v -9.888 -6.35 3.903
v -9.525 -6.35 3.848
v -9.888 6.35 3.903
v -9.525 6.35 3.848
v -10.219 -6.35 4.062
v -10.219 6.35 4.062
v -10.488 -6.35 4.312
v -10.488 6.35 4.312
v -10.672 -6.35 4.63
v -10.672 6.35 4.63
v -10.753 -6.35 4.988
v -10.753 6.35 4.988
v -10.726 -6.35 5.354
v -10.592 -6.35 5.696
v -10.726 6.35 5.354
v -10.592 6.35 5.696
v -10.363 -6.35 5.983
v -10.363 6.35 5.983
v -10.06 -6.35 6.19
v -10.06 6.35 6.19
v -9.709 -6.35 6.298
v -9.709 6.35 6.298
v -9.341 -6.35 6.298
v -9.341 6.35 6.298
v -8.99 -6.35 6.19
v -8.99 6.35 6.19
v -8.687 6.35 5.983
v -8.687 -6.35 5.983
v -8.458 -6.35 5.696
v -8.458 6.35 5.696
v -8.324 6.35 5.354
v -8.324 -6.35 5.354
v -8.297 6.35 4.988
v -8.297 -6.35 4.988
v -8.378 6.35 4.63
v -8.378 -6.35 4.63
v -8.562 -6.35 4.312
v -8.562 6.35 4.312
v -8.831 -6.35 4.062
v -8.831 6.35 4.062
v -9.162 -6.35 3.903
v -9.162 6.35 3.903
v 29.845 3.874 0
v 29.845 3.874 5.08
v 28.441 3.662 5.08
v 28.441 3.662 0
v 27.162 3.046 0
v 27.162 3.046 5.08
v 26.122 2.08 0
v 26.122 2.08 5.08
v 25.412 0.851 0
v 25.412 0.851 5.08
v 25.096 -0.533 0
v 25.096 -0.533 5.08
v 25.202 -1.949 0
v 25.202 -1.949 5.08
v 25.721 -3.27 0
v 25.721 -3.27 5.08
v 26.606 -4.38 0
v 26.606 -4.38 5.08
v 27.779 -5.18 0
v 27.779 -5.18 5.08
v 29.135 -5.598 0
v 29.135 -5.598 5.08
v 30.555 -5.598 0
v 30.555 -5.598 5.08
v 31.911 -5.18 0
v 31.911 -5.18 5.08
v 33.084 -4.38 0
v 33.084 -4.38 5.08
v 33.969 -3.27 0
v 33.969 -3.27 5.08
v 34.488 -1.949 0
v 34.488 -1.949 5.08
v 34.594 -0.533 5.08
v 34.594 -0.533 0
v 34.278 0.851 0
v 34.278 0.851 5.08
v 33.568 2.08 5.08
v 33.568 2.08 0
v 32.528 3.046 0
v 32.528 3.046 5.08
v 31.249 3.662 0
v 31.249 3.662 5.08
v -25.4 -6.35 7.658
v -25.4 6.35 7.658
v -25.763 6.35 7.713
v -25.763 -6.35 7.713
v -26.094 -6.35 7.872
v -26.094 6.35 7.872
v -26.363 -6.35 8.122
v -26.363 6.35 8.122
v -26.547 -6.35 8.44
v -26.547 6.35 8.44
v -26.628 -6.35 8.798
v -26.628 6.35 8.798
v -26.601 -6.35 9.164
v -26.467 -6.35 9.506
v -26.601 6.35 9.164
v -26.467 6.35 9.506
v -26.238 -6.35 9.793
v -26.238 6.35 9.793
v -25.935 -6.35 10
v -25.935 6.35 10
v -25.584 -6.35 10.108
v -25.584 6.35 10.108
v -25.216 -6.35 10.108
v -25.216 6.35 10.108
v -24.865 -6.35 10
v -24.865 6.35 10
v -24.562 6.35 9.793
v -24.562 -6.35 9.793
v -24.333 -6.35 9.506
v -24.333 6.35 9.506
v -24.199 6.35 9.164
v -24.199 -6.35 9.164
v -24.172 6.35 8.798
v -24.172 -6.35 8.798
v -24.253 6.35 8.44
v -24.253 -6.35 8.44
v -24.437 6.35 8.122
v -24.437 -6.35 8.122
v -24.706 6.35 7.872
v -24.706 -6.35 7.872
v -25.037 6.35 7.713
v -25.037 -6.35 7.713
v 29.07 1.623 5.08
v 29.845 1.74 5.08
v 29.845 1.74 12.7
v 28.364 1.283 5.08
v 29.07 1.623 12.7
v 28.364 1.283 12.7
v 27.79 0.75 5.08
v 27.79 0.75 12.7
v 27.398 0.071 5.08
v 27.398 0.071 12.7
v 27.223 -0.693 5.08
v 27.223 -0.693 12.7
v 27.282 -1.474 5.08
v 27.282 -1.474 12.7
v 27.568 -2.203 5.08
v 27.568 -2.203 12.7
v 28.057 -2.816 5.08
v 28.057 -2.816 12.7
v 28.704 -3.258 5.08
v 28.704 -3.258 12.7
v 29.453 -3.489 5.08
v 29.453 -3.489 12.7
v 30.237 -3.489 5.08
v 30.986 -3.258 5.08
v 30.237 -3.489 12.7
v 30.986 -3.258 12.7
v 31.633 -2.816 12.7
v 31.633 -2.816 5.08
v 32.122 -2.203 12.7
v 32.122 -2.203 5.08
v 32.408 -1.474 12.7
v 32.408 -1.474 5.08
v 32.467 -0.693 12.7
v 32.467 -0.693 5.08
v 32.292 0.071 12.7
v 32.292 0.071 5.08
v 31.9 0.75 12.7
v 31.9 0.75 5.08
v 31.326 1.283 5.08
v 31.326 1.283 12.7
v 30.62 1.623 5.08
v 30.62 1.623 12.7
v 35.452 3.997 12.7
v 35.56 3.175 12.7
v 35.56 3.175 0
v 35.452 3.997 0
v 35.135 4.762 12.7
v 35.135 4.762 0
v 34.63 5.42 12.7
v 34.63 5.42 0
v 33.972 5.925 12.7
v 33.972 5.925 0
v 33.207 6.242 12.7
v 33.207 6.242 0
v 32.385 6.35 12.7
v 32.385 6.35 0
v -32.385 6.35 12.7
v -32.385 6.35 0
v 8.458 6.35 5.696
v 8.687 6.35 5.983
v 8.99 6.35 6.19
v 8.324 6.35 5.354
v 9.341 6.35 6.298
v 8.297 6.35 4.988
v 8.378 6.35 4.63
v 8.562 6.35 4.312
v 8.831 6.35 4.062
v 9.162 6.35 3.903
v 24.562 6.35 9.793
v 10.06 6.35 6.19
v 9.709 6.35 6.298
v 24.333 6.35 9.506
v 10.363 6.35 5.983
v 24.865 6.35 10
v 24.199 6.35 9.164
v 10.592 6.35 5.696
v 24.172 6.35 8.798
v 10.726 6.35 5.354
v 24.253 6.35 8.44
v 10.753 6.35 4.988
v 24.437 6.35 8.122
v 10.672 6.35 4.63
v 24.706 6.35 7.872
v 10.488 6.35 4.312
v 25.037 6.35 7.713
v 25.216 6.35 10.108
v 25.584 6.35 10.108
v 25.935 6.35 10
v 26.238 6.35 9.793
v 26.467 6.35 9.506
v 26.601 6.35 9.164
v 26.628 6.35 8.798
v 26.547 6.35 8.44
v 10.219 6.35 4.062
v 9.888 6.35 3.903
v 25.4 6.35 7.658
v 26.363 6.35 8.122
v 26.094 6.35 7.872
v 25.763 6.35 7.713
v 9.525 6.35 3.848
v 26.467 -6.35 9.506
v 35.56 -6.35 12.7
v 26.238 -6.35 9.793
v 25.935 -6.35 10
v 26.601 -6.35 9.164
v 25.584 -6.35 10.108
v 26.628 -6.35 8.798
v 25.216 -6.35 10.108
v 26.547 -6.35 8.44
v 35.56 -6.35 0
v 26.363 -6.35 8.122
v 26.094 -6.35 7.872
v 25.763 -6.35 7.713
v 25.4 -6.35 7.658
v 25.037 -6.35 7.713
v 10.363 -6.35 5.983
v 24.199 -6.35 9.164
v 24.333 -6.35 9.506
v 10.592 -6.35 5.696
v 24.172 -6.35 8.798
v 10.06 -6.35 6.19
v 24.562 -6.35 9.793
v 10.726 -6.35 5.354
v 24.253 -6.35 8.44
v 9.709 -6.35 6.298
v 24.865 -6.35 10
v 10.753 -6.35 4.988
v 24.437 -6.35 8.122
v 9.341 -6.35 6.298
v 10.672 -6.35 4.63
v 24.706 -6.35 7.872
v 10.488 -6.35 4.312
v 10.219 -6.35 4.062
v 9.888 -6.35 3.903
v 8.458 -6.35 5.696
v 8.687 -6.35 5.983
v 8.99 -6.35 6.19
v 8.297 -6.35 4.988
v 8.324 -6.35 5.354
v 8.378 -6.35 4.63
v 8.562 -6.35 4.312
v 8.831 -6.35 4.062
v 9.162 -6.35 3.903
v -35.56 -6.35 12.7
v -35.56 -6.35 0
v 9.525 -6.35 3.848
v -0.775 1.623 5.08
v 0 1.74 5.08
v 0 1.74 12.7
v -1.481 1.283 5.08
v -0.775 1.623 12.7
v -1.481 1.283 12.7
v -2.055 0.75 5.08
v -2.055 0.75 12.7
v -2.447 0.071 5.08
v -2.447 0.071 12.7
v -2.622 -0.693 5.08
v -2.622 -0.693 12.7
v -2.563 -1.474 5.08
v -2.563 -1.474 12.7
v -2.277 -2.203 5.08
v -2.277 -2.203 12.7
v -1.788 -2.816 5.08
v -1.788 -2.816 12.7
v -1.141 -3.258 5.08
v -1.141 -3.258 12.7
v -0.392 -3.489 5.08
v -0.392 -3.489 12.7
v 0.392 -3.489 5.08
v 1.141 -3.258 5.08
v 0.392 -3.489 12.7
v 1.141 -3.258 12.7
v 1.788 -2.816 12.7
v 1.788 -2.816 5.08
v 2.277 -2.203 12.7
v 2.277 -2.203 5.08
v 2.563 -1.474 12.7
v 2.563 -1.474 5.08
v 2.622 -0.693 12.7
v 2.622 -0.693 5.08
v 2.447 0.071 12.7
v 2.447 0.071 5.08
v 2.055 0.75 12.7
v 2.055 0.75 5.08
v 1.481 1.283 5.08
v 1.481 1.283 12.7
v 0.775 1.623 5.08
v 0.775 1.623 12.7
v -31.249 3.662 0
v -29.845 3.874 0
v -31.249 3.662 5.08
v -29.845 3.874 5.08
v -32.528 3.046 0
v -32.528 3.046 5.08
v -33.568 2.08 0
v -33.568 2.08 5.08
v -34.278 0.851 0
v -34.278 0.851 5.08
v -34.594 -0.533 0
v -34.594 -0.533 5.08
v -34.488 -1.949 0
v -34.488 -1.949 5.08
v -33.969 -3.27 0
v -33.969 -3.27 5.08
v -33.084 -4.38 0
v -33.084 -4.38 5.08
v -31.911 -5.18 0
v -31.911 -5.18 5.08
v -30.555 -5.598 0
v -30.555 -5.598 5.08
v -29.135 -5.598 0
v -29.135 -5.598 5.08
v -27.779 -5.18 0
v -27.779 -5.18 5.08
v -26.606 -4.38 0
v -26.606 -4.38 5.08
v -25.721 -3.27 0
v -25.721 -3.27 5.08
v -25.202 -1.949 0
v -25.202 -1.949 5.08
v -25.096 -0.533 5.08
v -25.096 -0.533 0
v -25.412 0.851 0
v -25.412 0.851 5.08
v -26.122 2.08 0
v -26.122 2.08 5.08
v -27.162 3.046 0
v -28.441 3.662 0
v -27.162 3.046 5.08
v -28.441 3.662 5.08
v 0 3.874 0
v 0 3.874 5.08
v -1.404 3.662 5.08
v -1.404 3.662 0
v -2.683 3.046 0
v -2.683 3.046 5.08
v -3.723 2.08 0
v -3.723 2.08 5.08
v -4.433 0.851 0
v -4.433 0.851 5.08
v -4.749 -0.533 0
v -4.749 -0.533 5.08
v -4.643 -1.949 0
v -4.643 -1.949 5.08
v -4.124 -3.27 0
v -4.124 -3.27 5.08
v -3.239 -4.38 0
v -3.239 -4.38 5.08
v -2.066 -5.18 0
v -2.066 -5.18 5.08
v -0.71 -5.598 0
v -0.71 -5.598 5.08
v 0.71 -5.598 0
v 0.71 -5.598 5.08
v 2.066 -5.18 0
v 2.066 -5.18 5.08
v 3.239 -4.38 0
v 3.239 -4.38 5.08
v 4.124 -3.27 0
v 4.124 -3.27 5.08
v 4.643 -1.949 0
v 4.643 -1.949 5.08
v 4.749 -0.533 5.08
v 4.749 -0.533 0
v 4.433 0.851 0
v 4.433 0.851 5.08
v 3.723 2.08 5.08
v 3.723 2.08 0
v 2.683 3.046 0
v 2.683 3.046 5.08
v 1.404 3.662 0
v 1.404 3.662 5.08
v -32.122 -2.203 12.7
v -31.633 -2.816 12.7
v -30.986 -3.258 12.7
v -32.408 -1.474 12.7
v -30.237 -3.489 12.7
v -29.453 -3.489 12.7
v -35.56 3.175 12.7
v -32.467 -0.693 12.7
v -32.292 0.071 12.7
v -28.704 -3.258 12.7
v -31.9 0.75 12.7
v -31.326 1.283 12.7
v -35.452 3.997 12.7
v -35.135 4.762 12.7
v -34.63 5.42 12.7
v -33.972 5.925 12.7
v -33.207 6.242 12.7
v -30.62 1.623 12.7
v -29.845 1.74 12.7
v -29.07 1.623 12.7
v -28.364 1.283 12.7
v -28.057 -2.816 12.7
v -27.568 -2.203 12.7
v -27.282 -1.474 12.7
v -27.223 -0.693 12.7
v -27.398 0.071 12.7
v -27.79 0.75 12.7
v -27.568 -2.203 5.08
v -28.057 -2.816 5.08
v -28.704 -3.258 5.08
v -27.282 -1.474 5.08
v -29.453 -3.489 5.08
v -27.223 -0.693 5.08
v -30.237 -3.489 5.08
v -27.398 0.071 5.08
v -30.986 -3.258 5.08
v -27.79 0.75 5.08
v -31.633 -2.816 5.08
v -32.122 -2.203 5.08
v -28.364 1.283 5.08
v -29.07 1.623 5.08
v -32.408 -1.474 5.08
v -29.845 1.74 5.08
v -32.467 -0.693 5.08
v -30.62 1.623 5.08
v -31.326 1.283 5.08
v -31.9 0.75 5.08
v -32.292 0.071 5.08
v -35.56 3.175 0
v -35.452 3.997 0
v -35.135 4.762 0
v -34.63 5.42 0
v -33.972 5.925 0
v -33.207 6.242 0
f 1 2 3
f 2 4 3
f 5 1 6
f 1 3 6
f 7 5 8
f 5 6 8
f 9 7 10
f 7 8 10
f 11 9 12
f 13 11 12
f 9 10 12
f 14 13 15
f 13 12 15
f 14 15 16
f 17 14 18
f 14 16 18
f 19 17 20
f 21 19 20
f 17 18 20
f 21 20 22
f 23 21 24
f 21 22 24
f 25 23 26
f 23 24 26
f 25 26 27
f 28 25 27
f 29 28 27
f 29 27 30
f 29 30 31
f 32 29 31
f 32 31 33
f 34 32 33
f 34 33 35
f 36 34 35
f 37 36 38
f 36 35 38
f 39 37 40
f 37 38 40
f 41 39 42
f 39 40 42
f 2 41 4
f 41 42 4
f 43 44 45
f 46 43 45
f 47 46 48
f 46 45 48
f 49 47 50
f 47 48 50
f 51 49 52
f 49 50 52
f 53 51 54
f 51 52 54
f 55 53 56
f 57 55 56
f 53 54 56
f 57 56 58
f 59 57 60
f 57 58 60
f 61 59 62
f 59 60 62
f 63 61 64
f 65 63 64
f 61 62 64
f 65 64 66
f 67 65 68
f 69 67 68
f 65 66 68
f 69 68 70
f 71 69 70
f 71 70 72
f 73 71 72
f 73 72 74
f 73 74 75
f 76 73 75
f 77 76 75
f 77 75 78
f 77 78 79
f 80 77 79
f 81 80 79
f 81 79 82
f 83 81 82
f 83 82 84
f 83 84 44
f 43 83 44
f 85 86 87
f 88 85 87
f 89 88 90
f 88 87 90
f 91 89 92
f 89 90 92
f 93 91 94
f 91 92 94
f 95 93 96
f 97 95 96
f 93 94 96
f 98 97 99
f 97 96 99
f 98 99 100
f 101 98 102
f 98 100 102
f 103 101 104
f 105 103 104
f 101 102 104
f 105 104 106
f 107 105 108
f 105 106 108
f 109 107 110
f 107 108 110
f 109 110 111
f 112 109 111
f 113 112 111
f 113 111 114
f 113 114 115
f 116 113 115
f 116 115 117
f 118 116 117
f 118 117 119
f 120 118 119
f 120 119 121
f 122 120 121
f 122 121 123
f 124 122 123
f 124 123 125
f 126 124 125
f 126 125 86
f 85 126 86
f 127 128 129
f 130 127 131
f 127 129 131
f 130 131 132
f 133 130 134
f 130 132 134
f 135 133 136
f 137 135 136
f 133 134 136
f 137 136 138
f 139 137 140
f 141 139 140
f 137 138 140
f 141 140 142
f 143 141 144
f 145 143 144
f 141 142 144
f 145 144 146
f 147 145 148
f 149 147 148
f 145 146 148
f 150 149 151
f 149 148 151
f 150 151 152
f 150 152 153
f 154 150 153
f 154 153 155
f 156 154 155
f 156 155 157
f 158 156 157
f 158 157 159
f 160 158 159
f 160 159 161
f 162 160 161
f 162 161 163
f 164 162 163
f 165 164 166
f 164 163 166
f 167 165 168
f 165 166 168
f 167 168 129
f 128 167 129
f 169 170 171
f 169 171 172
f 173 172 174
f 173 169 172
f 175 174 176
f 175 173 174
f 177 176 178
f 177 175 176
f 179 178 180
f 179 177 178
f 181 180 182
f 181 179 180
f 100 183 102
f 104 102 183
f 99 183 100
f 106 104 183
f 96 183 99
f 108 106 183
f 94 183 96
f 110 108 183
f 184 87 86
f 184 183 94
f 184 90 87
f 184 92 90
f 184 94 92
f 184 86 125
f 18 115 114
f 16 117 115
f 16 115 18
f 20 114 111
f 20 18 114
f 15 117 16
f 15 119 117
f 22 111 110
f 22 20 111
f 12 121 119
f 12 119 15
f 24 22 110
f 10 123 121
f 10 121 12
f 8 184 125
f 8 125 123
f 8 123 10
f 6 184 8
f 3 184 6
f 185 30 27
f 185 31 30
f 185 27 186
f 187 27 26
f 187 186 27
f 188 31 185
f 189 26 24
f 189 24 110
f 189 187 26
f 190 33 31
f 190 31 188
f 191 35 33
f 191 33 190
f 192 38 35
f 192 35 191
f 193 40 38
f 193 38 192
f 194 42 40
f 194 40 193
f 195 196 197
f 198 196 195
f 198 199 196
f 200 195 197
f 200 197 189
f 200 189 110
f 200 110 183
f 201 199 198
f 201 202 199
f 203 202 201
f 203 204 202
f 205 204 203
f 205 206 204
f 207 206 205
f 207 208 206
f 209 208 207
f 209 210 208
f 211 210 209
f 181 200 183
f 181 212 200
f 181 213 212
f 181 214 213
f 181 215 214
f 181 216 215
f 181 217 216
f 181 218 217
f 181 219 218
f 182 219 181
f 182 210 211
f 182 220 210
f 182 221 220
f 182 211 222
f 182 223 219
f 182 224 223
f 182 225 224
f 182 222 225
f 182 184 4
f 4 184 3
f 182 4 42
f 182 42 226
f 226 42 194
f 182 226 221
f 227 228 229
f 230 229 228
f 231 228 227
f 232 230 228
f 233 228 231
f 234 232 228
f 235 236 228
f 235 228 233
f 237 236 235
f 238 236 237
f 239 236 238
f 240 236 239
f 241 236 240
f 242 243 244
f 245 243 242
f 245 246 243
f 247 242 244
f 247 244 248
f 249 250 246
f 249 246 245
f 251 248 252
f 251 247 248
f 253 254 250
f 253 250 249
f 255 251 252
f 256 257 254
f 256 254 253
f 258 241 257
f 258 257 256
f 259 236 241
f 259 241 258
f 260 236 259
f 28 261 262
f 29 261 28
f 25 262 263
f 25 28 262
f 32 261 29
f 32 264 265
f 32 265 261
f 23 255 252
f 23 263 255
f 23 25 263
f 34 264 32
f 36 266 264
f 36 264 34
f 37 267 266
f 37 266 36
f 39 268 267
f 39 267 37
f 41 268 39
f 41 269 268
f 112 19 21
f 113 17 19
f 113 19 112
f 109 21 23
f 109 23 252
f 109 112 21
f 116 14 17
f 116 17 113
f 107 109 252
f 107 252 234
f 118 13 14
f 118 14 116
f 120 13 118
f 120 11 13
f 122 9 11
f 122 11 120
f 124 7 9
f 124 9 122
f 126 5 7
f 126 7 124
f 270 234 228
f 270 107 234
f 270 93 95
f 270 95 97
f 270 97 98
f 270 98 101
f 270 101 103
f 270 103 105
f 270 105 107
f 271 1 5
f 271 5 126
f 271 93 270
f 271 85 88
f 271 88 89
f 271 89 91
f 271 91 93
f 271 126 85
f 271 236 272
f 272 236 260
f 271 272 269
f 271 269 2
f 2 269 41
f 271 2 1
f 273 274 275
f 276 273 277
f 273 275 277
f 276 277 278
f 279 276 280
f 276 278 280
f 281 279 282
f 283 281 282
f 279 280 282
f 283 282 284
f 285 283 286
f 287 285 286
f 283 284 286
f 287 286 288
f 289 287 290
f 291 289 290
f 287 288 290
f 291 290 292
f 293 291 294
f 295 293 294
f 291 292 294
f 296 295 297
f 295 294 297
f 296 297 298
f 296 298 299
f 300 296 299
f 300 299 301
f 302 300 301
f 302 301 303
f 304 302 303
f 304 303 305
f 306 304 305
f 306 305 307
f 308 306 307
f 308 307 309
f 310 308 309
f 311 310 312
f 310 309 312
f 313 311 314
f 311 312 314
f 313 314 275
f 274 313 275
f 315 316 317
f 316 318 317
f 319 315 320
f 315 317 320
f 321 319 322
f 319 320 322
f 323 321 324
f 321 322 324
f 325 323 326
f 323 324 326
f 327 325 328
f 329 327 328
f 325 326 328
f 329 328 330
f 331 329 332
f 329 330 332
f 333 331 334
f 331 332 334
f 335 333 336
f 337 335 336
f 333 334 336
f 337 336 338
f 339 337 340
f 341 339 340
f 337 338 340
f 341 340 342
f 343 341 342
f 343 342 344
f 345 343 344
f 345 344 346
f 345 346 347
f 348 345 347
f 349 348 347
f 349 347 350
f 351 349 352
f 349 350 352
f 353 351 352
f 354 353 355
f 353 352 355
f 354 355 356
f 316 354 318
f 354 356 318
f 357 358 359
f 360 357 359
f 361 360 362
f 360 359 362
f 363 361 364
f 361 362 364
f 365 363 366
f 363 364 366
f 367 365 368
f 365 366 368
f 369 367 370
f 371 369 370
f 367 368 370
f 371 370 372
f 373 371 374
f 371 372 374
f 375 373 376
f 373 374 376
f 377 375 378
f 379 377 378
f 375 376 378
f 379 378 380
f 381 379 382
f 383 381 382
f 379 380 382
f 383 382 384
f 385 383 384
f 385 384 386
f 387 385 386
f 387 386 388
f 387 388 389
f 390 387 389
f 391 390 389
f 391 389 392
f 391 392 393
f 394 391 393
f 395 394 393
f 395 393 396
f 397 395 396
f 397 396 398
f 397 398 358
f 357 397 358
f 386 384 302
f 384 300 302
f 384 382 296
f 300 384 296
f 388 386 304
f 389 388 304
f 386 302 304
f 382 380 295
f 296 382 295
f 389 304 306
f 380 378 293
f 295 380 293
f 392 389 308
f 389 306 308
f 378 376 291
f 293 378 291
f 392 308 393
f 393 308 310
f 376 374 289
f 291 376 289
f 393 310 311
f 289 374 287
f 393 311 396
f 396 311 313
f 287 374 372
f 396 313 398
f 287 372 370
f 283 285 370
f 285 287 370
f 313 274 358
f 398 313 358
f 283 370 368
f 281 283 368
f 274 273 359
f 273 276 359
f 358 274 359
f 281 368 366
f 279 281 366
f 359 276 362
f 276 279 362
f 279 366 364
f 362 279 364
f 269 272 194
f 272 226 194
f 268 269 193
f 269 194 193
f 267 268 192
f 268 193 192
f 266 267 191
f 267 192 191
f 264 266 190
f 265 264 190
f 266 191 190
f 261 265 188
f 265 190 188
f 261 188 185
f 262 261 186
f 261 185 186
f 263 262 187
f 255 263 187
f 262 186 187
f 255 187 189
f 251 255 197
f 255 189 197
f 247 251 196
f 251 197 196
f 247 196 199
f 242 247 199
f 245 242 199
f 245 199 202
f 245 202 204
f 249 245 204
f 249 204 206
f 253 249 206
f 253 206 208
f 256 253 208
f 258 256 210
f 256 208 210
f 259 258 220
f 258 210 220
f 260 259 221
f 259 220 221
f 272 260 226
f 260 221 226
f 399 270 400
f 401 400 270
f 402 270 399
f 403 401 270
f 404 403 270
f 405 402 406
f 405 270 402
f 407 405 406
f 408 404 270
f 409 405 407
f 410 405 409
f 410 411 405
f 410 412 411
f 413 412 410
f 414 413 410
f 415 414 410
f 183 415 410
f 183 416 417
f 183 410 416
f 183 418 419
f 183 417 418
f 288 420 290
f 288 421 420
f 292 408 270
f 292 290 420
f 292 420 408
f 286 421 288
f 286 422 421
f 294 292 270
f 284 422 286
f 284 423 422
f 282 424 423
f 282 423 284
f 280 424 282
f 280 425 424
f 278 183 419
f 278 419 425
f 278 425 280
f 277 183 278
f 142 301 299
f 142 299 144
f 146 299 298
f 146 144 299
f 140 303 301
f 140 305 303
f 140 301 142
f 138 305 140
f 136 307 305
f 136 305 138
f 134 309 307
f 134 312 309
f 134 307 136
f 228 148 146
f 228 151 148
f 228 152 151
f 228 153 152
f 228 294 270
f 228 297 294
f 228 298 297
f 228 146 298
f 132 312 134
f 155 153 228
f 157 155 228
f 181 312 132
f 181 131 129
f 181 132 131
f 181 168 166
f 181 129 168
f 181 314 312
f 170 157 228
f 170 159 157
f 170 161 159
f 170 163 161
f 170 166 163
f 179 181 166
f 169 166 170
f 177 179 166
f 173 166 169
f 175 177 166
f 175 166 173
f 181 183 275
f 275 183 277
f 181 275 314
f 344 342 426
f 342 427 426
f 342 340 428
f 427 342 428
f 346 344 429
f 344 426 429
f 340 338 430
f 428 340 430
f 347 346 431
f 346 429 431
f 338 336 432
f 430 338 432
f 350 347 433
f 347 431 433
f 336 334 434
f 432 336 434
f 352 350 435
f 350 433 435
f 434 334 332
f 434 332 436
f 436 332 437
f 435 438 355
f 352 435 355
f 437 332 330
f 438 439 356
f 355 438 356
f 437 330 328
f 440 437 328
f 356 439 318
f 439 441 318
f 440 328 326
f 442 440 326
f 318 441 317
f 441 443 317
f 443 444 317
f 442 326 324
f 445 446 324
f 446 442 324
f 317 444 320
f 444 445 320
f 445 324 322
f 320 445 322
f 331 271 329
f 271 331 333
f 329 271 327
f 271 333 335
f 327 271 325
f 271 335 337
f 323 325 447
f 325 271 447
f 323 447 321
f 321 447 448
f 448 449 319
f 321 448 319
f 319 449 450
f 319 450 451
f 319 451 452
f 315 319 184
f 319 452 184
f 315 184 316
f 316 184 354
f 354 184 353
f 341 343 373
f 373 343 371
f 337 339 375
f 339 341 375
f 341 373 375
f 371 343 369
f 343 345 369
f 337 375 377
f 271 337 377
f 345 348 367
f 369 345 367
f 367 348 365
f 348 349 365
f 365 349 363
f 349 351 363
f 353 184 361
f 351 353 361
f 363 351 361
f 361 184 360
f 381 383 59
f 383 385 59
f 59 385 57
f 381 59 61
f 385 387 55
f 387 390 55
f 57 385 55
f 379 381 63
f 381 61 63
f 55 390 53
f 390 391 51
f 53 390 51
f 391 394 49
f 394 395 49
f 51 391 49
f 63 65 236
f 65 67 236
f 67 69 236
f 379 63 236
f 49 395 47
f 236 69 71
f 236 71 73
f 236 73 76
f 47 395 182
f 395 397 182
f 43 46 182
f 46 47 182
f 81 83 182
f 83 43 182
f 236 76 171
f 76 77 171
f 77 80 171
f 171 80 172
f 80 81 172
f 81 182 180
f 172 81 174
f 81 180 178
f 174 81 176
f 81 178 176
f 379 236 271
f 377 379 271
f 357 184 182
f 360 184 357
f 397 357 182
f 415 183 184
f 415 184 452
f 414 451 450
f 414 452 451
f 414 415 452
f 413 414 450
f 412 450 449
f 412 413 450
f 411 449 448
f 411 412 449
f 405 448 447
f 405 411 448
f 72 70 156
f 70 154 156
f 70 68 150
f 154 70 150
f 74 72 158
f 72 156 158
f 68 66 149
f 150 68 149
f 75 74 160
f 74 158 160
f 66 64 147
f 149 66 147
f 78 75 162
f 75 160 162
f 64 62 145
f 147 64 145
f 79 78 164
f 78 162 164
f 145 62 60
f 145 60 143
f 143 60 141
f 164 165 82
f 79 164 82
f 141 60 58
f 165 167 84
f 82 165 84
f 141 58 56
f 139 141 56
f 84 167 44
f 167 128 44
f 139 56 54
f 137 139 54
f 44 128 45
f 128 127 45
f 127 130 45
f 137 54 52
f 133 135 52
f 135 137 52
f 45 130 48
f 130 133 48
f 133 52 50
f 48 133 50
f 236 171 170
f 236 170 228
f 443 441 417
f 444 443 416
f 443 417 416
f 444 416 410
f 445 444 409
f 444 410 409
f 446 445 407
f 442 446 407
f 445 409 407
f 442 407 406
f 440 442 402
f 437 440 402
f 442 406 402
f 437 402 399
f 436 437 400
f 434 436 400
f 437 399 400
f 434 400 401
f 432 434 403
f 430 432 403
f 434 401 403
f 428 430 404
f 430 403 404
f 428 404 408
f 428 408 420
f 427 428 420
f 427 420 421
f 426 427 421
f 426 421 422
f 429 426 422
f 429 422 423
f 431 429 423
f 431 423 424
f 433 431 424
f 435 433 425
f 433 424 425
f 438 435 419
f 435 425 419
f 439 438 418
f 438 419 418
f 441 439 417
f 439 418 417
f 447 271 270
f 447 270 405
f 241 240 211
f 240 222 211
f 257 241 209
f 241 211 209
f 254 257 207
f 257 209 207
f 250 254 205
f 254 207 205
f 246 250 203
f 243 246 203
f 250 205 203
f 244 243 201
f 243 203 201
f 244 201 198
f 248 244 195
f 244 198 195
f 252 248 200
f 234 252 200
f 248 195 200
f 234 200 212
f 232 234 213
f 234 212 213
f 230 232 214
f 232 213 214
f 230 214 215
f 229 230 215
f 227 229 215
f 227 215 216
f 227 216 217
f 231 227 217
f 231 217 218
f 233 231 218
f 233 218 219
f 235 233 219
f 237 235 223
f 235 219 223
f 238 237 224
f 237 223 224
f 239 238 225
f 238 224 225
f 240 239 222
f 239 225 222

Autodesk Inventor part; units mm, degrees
ref_plane "YZ Plane" through (0, 0, 0) normal (1, 0, 0) x (0, 1, 0)
ref_plane "XZ Plane" through (0, 0, 0) normal (0, 1, 0) x (-1, 0, 0)
ref_plane "XY Plane" through (0, 0, 0) normal (0, 0, 1) x (1, 0, 0)
sketch "Sketch1" plane through (0, 0, 0) normal (0, 0, 1) x (1, 0, 0)
  line L0 (35.56, -6.35) -> (-35.56, -6.35)
  line L1 (-35.56, -6.35) -> (-35.56, 6.35)
  line L2 (-35.56, 6.35) -> (35.56, 6.35)
  line L3 (35.56, 6.35) -> (35.56, -6.35)
  line L4 (35.56, -6.35) -> (-35.56, 6.35) construction
  line L5 (-35.56, -6.35) -> (35.56, 6.35) construction
  line L6 (0, 8.89) -> (0, -8.89) projected
  line L7 (-49.784, 0) -> (49.784, 0) projected
  point P0 (0, 0)
  point P1 (-29.845, -0.889)
  point P2 (0, -0.889)
  point P3 (29.845, -0.889)
  point P4 (0, 0)
  dimension "d0" = 71.12
  dimension "d1" = 12.7
  dimension "d4" = 29.845
  dimension "d5" = 5.461
  dimension "d6" = 29.845
extrude "Extrusion1" add sketch "Sketch1" along normal blind 12.7
hole "Hole1" at (-29.845, -0.889, 0) at (0, -0.889, 0) at (29.845, -0.889, 0) direction (0, 0, 1) diameter 5.2578 end through all counterbore diameter 9.525 counterbore depth 5.08
sketch "Sketch2" plane through (0, 0, 0) normal (1, 0, 0) x (0, 1, 0)
  line L0 (-6.35, 0) -> (-6.35, 12.7) projected
  line L1 (-6.35, 12.7) -> (6.35, 12.7) projected
  line L2 (-6.35, 12.7) -> (-7.112, 12.7)
  line L3 (-7.112, 12.7) -> (-7.112, 13.462)
  line L4 (-7.112, 13.462) -> (-6.35, 13.462)
  line L5 (-6.35, 13.462) -> (-6.35, 15.24)
  line L6 (-6.35, 15.24) -> (-8.89, 15.24)
  line L7 (-8.89, 15.24) -> (-8.89, 10.795)
  line L8 (-8.89, 10.795) -> (-6.35, 8.255)
  line L9 (-6.35, 8.255) -> (-6.35, 12.7)
  point P0 (0, 0)
  dimension "d15" = 0.762
  dimension "d16" = 0.762
  dimension "d17" = 2.54
  dimension "d18" = 2.54
  dimension "d19" = 45
  dimension "d20" = 4.445
extrude "Extrusion2" [suppressed]
sketch "Sketch3" plane through (-35.56, -6.35, 0) normal (0, -1, 0) x (1, 0, 0)
  line L0 (35.56, 15.24) -> (35.56, -2.54) projected
  line L1 (-14.224, 0) -> (85.344, 0) projected
  point P0 (35.56, 0)
  point P1 (26.035, 5.08)
  point P2 (45.085, 5.08)
  point P3 (10.16, 8.89)
  point P4 (60.96, 8.89)
  dimension "d23" = 9.525
  dimension "d24" = 9.525
  dimension "d35" = 8.89
  dimension "d36" = 8.89
  dimension "d37" = 5.08
  dimension "d38" = 15.875
  dimension "d39" = 15.875
hole "Hole2" at (25.4, -6.35, 8.89) at (9.525, -6.35, 5.08) at (-9.525, -6.35, 5.08) at (-25.4, -6.35, 8.89) direction (0, 1, 0) diameter 2.4638 end through all
fillet "Fillet1" radius 3.175 2 edges at (35.56, 6.35, 6.35) (-35.56, 6.35, 6.35)
properties part number "J005362" material "ALUMINUM, 6061-T651"
